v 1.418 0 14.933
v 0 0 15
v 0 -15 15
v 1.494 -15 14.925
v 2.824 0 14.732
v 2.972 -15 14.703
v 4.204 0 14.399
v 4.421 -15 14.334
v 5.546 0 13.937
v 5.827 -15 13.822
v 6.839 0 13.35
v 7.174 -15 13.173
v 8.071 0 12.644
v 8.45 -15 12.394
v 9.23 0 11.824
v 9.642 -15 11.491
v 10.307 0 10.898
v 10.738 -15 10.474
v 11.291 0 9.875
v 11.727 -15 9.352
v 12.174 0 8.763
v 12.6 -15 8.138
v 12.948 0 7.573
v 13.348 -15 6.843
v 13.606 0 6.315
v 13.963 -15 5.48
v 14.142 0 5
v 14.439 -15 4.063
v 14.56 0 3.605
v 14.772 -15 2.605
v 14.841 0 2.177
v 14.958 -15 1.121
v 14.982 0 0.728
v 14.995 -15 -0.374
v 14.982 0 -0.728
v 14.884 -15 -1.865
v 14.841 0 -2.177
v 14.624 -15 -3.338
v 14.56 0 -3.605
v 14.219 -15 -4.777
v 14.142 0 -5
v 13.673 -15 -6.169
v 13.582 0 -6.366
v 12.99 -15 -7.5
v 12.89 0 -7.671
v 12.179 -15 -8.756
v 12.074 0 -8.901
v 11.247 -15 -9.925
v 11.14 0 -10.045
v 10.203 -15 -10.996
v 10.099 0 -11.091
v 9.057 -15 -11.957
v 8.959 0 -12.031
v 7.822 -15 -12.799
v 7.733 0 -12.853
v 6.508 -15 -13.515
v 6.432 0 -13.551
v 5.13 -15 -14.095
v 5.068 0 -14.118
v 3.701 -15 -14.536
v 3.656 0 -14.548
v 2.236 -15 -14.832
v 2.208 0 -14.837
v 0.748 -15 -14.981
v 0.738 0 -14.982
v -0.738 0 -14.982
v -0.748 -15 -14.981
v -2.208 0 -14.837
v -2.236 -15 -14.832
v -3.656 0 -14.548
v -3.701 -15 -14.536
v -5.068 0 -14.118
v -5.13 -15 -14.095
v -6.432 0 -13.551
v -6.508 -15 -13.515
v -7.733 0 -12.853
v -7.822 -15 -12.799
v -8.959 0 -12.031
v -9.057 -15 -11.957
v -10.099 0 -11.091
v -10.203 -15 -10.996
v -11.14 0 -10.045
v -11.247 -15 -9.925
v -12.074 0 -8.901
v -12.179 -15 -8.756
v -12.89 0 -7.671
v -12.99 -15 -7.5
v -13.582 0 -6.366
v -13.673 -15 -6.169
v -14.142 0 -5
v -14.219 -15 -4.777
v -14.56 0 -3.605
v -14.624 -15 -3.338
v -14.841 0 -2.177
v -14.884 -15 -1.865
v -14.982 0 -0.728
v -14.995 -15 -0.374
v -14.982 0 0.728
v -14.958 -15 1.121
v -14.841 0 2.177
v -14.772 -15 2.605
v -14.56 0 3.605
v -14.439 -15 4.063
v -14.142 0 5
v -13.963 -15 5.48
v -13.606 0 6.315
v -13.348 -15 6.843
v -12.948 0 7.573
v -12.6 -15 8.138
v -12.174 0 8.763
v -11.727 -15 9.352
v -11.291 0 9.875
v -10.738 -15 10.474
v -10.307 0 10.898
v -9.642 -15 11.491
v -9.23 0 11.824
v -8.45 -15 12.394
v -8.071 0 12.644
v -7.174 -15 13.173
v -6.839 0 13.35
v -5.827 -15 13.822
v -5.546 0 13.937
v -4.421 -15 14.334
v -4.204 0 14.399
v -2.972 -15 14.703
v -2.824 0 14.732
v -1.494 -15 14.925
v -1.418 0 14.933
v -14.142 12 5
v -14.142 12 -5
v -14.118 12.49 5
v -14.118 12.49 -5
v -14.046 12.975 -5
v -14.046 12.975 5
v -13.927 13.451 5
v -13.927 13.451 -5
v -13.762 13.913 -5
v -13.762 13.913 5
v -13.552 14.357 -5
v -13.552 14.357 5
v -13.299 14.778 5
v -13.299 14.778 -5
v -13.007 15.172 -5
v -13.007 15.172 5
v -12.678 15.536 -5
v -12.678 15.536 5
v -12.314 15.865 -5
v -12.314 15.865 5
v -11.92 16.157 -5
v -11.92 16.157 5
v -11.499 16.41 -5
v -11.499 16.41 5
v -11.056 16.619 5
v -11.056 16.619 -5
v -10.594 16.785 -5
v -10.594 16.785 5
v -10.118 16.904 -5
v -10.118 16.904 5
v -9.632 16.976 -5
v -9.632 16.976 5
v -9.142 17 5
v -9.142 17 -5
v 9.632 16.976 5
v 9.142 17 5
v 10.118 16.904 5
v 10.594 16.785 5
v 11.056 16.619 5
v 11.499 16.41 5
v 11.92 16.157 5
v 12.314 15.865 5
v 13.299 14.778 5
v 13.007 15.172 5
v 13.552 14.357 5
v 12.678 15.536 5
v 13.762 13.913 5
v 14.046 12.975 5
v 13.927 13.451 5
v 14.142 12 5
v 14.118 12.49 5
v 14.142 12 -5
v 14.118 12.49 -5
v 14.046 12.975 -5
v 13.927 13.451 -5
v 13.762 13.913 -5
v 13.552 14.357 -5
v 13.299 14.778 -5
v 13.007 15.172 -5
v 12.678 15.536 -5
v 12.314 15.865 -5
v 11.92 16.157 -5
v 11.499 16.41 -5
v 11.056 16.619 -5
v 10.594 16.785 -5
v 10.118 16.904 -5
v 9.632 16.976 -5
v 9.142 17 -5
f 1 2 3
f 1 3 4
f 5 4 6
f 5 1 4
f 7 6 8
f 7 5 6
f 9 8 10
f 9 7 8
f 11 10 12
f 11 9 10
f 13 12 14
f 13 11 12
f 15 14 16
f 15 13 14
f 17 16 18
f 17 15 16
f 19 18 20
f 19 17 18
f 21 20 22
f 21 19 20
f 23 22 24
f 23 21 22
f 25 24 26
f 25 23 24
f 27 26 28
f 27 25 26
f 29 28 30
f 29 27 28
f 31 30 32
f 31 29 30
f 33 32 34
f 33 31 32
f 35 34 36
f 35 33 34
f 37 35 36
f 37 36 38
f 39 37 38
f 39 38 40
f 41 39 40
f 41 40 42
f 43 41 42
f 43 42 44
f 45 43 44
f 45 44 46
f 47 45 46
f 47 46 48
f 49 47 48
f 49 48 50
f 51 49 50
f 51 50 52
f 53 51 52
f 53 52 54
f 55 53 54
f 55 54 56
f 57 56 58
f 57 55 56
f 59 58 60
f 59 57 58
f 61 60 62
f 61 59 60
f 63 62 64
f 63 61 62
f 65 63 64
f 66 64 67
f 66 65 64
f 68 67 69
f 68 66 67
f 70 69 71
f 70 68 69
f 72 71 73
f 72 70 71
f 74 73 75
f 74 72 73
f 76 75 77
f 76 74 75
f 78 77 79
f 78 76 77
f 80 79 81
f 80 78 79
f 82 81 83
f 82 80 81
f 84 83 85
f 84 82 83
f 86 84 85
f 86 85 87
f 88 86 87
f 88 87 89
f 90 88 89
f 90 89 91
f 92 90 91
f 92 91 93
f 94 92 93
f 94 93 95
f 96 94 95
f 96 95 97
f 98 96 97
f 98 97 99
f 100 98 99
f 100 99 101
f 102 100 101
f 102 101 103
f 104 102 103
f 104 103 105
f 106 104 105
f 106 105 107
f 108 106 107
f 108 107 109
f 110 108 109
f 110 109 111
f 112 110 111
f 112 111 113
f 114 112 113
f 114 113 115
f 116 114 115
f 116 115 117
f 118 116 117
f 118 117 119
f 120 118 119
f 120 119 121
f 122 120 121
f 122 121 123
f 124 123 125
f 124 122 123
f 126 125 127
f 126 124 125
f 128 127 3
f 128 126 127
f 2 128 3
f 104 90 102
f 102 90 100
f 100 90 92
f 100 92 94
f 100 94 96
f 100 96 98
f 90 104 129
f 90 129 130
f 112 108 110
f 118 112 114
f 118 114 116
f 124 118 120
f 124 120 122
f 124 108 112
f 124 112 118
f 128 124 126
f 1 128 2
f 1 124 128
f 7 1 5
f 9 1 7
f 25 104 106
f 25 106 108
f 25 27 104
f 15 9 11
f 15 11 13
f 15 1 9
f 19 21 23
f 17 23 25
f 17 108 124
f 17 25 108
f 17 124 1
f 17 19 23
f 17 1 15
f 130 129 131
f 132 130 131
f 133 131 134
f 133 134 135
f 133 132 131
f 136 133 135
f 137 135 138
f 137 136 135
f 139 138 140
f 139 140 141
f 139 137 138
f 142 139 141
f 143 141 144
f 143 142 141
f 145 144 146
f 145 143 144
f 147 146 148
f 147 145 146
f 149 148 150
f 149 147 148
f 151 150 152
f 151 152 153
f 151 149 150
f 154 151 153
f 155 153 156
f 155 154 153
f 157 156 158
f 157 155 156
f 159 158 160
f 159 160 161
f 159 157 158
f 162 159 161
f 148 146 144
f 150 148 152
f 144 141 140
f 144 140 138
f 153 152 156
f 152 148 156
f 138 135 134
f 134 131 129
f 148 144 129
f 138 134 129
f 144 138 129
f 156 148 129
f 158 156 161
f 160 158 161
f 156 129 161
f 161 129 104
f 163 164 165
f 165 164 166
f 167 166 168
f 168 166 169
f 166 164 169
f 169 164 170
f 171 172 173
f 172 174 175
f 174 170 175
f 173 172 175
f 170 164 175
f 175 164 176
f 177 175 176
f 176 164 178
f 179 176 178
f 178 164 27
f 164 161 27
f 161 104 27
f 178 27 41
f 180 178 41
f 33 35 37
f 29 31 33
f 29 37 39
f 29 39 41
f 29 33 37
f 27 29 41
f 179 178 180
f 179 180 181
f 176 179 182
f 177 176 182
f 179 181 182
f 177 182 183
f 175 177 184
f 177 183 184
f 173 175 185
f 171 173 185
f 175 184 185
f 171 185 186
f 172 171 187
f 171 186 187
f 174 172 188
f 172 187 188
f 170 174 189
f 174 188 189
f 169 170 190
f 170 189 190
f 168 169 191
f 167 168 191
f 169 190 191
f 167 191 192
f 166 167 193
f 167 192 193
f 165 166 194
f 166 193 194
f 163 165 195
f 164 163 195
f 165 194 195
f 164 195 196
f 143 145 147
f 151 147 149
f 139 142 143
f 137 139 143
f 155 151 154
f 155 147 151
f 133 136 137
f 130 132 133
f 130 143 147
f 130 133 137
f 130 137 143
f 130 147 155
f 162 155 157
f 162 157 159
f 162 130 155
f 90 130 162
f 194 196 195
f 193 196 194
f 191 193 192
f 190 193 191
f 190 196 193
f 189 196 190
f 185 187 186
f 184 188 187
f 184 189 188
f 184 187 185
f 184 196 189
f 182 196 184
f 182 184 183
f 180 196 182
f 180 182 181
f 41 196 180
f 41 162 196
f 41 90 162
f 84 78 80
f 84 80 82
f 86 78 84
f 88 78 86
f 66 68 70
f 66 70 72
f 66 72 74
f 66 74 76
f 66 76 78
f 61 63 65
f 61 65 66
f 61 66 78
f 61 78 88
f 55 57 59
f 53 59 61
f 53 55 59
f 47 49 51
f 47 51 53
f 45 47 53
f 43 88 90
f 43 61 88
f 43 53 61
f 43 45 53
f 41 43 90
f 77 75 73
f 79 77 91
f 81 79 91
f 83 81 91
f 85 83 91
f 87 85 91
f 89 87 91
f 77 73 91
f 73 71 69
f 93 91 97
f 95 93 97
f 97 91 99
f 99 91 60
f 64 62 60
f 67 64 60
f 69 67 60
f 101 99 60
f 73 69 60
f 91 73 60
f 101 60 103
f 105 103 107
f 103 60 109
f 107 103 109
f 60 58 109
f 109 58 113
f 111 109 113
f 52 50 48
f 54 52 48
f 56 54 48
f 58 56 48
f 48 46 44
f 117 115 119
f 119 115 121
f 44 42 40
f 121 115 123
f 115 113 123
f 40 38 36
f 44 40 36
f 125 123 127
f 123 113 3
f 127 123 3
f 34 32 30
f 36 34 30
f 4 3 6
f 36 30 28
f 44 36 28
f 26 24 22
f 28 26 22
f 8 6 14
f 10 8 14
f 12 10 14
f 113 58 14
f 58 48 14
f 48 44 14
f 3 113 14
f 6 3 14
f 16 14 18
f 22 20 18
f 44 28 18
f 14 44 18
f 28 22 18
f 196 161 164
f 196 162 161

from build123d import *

# Parameters (mm, degrees)
SKETCH1_R           = 15
BOSS_EXTRUDE1_DEPTH = 15
SKETCH4_W           = 28.284271248
SKETCH4_H           = 10
BOSS_EXTRUDE3_DEPTH = 17
FILLET3_R           = 5


with BuildPart() as part:
    # Sketch1 → Boss-Extrude1 (new body)
    with BuildSketch(Plane(origin=(0, 0, 0), x_dir=(1, 0, 0), z_dir=(0, 1, 0))):
        with Locations(Location((0, 0, 0), (0, 0, 270))):
            Circle(SKETCH1_R)
    extrude(amount=-BOSS_EXTRUDE1_DEPTH)

    # Sketch4 → Boss-Extrude3 (add)
    with BuildSketch(Plane(origin=(0, 0, 0), x_dir=(1, 0, 0), z_dir=(0, 1, 0))):
        Rectangle(SKETCH4_W, SKETCH4_H)
    extrude(amount=BOSS_EXTRUDE3_DEPTH)

    # Fillet3
    fillet3_edges = [part.edges().sort_by_distance(p)[0] for p in [
        (-14.142135624, 17, 0),
        (14.142135624, 17, 0),
    ]]
    fillet(fillet3_edges, radius=FILLET3_R)


solid = part.part
